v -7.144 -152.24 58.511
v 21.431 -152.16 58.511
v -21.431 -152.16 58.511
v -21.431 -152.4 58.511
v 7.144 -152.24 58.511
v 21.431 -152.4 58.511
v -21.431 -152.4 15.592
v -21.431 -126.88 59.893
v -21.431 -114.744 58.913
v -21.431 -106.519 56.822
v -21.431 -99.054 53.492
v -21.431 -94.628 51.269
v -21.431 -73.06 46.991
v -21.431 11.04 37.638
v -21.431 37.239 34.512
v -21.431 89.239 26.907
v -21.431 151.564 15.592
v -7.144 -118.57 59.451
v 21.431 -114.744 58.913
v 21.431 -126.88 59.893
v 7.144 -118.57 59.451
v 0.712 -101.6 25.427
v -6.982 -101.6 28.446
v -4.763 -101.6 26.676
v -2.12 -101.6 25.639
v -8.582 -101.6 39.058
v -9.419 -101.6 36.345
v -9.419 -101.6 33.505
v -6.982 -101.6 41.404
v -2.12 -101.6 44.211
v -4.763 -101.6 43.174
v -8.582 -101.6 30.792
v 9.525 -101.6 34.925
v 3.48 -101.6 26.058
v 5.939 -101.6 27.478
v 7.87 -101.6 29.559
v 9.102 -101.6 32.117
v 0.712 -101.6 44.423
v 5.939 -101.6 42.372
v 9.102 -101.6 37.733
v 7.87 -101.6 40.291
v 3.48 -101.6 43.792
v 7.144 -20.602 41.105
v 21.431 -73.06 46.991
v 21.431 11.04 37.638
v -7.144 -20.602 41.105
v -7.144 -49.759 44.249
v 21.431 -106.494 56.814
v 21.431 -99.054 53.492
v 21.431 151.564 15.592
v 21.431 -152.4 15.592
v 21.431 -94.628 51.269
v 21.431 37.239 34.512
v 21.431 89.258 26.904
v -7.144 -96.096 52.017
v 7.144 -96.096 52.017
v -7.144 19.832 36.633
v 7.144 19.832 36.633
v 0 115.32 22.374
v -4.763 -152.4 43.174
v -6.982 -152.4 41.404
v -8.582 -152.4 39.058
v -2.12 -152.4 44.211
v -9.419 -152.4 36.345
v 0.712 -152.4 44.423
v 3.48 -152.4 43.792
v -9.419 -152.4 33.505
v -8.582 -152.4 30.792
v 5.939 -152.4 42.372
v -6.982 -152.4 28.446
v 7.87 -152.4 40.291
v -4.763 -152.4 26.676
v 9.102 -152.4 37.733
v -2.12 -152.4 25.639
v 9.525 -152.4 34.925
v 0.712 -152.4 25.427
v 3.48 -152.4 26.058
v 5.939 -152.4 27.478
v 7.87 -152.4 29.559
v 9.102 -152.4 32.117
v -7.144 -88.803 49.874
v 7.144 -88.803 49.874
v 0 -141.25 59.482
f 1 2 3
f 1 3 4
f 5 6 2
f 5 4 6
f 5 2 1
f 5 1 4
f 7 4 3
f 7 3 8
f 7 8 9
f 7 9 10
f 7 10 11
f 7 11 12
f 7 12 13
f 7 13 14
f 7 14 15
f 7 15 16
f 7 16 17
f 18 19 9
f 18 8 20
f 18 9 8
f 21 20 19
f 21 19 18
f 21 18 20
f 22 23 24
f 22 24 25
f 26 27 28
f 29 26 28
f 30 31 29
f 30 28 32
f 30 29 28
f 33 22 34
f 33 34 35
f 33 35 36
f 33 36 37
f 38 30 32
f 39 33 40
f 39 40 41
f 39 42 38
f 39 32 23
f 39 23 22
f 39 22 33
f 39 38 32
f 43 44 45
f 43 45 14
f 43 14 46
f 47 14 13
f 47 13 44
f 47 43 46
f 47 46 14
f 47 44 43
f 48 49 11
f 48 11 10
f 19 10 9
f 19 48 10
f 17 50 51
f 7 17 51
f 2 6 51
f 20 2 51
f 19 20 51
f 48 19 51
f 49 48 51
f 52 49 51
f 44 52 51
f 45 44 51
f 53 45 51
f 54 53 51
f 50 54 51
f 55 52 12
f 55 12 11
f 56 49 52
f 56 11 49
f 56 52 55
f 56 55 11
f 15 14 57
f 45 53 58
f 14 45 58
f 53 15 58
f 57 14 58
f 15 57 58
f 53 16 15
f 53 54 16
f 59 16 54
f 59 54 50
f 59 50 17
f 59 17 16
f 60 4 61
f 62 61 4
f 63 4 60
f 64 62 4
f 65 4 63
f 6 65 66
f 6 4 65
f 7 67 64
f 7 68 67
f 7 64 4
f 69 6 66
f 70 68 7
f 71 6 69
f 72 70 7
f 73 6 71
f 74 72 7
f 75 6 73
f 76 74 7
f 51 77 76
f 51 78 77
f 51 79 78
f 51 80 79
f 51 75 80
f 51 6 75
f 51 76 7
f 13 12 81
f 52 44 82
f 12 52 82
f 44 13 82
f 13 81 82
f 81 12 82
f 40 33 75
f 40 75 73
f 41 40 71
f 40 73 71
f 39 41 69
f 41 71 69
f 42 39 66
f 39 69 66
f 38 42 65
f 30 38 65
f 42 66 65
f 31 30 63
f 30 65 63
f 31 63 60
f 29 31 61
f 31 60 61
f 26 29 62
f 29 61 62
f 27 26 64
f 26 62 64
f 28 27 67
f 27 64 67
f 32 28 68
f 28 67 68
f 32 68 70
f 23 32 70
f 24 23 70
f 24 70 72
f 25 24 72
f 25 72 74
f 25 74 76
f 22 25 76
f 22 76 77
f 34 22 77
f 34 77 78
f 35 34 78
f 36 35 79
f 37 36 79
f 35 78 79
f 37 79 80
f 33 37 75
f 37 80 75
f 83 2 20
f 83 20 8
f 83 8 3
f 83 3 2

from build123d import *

# Parameters (mm, degrees)
F1_DEPTH = 21.43125
F2_R     = 9.525
F3_DEPTH = 50.8
F8_DEPTH = 56.3


# Not quite as in the source:
# - ends of sketch curves that miss each other by under 0.0002 mm in the source are joined


with BuildPart() as f1:
    # F0 (on Right) → F1 (new body, symmetric)
    with BuildSketch(Plane.YZ):
        Polygon((-152.4, 69.85), (-152.4, 0), (152.4, 0), (152.4, 19.05), align=None)
    extrude(amount=F1_DEPTH, both=True)

    # F2 (on face) → F3 (cut)
    with BuildSketch(Plane.XZ.offset(152.4)):
        with Locations((0, 34.925)):
            Circle(F2_R)
    extrude(amount=-F3_DEPTH, mode=Mode.SUBTRACT)

    # F5 (on face) → F8 (cut)
    with BuildSketch(Plane.YZ.offset(21.43125)):
        with BuildLine():
            add(Edge.make_bspline(
                [(-94.6281477809, 51.2691959739), (-96.0952206694, 52.0179937663), (-97.562293558, 52.7667915588), (-99.0539994454, 53.491879309)],
                knots=[0, 0, 0, 0, 0.1035282224, 0.1035282224, 0.1035282224, 0.1035282224], degree=3))
            add(Edge.make_bspline(
                [(-94.6281477809, 51.2691959739), (-88.9739529123, 49.8775010567), (-83.3197580522, 48.4858061416), (-73.0600804397, 46.9911508307)],
                knots=[0, 0, 0, 0, 0.1804237123, 0.1804237123, 0.1804237123, 0.1804237123], degree=3))
            add(Edge.make_bspline(
                [(11.0397725003, 37.6377859426), (-20.7191231776, 41.240284312), (-53.8117553476, 44.4768553148), (-73.0600804397, 46.9911508307)],
                knots=[0.3821429542, 0.3821429542, 0.3821429542, 0.3821429542, 0.5639196837, 0.5639196837, 0.5639196837, 0.5639196837], degree=3))
            add(Edge.make_bspline(
                [(11.0397725003, 37.6377859426), (19.8326583687, 36.6506728683), (28.6537852654, 35.611343032), (37.2394360057, 34.5120057533)],
                knots=[0.5008053198, 0.5008053198, 0.5008053198, 0.5008053198, 0.5858071806, 0.5858071806, 0.5858071806, 0.5858071806], degree=3))
            add(Edge.make_bspline(
                [(151.5644788742, 15.5920218676), (140.3358248303, 17.736038831), (112.6697575345, 23.0186414795), (69.4706003693, 30.4232191611), (37.2394360057, 34.5120057533)],
                knots=[0, 0, 0, 0, 0.1343010577, 0.3309018237, 0.3309018237, 0.3309018237, 0.3309018237], degree=3))
            Line((151.5644788742, 15.5920218676), (-152.4, 15.5920218676))
            Line((-152.4, 15.5920218676), (-152.4, 0))
            Line((-152.4, 0), (152.4, 0))
            Line((152.4, 0), (152.4, 19.05))
            Line((152.4, 19.05), (-152.4, 69.85))
            Line((-152.4, 69.85), (-152.4, 58.510940522))
            add(Edge.make_bspline(
                [(-152.1597802639, 58.510940522), (-152.2398342689, 58.510940522), (-152.3198882739, 58.510940522), (-152.4, 58.510940522)],
                knots=[0, 0, 0, 0, 0.240162015, 0.240162015, 0.240162015, 0.240162015], degree=3))
            add(Edge.make_bspline(
                [(-126.880271242, 59.893312547), (-131.0252775202, 59.9641176604), (-141.283309107, 59.6280745769), (-148.0759439731, 58.9303957414), (-152.1597802639, 58.510940522)],
                knots=[0.8645812396, 0.8645812396, 0.8645812396, 0.8645812396, 0.9185841637, 1, 1, 1, 1], degree=3))
            add(Edge.make_bspline(
                [(-114.7441045161, 58.9132569857), (-118.4444301689, 59.5720764958), (-122.5362126789, 59.8541063708), (-126.880271242, 59.893312547)],
                knots=[0.431288265, 0.431288265, 0.431288265, 0.431288265, 0.6334912794, 0.6334912794, 0.6334912794, 0.6334912794], degree=3))
            add(Edge.make_bspline(
                [(-99.0539994454, 53.491879309), (-99.5844007901, 53.7839672826), (-103.1690308471, 55.7243154808), (-108.8461739052, 57.9235356565), (-114.7441045161, 58.9132569857)],
                knots=[0.7100922868, 0.7100922868, 0.7100922868, 0.7100922868, 0.7255634136, 0.8104095628, 0.8104095628, 0.8104095628, 0.8104095628], degree=3))
        make_face()
    extrude(amount=-F8_DEPTH, mode=Mode.SUBTRACT)


solid = f1.part
